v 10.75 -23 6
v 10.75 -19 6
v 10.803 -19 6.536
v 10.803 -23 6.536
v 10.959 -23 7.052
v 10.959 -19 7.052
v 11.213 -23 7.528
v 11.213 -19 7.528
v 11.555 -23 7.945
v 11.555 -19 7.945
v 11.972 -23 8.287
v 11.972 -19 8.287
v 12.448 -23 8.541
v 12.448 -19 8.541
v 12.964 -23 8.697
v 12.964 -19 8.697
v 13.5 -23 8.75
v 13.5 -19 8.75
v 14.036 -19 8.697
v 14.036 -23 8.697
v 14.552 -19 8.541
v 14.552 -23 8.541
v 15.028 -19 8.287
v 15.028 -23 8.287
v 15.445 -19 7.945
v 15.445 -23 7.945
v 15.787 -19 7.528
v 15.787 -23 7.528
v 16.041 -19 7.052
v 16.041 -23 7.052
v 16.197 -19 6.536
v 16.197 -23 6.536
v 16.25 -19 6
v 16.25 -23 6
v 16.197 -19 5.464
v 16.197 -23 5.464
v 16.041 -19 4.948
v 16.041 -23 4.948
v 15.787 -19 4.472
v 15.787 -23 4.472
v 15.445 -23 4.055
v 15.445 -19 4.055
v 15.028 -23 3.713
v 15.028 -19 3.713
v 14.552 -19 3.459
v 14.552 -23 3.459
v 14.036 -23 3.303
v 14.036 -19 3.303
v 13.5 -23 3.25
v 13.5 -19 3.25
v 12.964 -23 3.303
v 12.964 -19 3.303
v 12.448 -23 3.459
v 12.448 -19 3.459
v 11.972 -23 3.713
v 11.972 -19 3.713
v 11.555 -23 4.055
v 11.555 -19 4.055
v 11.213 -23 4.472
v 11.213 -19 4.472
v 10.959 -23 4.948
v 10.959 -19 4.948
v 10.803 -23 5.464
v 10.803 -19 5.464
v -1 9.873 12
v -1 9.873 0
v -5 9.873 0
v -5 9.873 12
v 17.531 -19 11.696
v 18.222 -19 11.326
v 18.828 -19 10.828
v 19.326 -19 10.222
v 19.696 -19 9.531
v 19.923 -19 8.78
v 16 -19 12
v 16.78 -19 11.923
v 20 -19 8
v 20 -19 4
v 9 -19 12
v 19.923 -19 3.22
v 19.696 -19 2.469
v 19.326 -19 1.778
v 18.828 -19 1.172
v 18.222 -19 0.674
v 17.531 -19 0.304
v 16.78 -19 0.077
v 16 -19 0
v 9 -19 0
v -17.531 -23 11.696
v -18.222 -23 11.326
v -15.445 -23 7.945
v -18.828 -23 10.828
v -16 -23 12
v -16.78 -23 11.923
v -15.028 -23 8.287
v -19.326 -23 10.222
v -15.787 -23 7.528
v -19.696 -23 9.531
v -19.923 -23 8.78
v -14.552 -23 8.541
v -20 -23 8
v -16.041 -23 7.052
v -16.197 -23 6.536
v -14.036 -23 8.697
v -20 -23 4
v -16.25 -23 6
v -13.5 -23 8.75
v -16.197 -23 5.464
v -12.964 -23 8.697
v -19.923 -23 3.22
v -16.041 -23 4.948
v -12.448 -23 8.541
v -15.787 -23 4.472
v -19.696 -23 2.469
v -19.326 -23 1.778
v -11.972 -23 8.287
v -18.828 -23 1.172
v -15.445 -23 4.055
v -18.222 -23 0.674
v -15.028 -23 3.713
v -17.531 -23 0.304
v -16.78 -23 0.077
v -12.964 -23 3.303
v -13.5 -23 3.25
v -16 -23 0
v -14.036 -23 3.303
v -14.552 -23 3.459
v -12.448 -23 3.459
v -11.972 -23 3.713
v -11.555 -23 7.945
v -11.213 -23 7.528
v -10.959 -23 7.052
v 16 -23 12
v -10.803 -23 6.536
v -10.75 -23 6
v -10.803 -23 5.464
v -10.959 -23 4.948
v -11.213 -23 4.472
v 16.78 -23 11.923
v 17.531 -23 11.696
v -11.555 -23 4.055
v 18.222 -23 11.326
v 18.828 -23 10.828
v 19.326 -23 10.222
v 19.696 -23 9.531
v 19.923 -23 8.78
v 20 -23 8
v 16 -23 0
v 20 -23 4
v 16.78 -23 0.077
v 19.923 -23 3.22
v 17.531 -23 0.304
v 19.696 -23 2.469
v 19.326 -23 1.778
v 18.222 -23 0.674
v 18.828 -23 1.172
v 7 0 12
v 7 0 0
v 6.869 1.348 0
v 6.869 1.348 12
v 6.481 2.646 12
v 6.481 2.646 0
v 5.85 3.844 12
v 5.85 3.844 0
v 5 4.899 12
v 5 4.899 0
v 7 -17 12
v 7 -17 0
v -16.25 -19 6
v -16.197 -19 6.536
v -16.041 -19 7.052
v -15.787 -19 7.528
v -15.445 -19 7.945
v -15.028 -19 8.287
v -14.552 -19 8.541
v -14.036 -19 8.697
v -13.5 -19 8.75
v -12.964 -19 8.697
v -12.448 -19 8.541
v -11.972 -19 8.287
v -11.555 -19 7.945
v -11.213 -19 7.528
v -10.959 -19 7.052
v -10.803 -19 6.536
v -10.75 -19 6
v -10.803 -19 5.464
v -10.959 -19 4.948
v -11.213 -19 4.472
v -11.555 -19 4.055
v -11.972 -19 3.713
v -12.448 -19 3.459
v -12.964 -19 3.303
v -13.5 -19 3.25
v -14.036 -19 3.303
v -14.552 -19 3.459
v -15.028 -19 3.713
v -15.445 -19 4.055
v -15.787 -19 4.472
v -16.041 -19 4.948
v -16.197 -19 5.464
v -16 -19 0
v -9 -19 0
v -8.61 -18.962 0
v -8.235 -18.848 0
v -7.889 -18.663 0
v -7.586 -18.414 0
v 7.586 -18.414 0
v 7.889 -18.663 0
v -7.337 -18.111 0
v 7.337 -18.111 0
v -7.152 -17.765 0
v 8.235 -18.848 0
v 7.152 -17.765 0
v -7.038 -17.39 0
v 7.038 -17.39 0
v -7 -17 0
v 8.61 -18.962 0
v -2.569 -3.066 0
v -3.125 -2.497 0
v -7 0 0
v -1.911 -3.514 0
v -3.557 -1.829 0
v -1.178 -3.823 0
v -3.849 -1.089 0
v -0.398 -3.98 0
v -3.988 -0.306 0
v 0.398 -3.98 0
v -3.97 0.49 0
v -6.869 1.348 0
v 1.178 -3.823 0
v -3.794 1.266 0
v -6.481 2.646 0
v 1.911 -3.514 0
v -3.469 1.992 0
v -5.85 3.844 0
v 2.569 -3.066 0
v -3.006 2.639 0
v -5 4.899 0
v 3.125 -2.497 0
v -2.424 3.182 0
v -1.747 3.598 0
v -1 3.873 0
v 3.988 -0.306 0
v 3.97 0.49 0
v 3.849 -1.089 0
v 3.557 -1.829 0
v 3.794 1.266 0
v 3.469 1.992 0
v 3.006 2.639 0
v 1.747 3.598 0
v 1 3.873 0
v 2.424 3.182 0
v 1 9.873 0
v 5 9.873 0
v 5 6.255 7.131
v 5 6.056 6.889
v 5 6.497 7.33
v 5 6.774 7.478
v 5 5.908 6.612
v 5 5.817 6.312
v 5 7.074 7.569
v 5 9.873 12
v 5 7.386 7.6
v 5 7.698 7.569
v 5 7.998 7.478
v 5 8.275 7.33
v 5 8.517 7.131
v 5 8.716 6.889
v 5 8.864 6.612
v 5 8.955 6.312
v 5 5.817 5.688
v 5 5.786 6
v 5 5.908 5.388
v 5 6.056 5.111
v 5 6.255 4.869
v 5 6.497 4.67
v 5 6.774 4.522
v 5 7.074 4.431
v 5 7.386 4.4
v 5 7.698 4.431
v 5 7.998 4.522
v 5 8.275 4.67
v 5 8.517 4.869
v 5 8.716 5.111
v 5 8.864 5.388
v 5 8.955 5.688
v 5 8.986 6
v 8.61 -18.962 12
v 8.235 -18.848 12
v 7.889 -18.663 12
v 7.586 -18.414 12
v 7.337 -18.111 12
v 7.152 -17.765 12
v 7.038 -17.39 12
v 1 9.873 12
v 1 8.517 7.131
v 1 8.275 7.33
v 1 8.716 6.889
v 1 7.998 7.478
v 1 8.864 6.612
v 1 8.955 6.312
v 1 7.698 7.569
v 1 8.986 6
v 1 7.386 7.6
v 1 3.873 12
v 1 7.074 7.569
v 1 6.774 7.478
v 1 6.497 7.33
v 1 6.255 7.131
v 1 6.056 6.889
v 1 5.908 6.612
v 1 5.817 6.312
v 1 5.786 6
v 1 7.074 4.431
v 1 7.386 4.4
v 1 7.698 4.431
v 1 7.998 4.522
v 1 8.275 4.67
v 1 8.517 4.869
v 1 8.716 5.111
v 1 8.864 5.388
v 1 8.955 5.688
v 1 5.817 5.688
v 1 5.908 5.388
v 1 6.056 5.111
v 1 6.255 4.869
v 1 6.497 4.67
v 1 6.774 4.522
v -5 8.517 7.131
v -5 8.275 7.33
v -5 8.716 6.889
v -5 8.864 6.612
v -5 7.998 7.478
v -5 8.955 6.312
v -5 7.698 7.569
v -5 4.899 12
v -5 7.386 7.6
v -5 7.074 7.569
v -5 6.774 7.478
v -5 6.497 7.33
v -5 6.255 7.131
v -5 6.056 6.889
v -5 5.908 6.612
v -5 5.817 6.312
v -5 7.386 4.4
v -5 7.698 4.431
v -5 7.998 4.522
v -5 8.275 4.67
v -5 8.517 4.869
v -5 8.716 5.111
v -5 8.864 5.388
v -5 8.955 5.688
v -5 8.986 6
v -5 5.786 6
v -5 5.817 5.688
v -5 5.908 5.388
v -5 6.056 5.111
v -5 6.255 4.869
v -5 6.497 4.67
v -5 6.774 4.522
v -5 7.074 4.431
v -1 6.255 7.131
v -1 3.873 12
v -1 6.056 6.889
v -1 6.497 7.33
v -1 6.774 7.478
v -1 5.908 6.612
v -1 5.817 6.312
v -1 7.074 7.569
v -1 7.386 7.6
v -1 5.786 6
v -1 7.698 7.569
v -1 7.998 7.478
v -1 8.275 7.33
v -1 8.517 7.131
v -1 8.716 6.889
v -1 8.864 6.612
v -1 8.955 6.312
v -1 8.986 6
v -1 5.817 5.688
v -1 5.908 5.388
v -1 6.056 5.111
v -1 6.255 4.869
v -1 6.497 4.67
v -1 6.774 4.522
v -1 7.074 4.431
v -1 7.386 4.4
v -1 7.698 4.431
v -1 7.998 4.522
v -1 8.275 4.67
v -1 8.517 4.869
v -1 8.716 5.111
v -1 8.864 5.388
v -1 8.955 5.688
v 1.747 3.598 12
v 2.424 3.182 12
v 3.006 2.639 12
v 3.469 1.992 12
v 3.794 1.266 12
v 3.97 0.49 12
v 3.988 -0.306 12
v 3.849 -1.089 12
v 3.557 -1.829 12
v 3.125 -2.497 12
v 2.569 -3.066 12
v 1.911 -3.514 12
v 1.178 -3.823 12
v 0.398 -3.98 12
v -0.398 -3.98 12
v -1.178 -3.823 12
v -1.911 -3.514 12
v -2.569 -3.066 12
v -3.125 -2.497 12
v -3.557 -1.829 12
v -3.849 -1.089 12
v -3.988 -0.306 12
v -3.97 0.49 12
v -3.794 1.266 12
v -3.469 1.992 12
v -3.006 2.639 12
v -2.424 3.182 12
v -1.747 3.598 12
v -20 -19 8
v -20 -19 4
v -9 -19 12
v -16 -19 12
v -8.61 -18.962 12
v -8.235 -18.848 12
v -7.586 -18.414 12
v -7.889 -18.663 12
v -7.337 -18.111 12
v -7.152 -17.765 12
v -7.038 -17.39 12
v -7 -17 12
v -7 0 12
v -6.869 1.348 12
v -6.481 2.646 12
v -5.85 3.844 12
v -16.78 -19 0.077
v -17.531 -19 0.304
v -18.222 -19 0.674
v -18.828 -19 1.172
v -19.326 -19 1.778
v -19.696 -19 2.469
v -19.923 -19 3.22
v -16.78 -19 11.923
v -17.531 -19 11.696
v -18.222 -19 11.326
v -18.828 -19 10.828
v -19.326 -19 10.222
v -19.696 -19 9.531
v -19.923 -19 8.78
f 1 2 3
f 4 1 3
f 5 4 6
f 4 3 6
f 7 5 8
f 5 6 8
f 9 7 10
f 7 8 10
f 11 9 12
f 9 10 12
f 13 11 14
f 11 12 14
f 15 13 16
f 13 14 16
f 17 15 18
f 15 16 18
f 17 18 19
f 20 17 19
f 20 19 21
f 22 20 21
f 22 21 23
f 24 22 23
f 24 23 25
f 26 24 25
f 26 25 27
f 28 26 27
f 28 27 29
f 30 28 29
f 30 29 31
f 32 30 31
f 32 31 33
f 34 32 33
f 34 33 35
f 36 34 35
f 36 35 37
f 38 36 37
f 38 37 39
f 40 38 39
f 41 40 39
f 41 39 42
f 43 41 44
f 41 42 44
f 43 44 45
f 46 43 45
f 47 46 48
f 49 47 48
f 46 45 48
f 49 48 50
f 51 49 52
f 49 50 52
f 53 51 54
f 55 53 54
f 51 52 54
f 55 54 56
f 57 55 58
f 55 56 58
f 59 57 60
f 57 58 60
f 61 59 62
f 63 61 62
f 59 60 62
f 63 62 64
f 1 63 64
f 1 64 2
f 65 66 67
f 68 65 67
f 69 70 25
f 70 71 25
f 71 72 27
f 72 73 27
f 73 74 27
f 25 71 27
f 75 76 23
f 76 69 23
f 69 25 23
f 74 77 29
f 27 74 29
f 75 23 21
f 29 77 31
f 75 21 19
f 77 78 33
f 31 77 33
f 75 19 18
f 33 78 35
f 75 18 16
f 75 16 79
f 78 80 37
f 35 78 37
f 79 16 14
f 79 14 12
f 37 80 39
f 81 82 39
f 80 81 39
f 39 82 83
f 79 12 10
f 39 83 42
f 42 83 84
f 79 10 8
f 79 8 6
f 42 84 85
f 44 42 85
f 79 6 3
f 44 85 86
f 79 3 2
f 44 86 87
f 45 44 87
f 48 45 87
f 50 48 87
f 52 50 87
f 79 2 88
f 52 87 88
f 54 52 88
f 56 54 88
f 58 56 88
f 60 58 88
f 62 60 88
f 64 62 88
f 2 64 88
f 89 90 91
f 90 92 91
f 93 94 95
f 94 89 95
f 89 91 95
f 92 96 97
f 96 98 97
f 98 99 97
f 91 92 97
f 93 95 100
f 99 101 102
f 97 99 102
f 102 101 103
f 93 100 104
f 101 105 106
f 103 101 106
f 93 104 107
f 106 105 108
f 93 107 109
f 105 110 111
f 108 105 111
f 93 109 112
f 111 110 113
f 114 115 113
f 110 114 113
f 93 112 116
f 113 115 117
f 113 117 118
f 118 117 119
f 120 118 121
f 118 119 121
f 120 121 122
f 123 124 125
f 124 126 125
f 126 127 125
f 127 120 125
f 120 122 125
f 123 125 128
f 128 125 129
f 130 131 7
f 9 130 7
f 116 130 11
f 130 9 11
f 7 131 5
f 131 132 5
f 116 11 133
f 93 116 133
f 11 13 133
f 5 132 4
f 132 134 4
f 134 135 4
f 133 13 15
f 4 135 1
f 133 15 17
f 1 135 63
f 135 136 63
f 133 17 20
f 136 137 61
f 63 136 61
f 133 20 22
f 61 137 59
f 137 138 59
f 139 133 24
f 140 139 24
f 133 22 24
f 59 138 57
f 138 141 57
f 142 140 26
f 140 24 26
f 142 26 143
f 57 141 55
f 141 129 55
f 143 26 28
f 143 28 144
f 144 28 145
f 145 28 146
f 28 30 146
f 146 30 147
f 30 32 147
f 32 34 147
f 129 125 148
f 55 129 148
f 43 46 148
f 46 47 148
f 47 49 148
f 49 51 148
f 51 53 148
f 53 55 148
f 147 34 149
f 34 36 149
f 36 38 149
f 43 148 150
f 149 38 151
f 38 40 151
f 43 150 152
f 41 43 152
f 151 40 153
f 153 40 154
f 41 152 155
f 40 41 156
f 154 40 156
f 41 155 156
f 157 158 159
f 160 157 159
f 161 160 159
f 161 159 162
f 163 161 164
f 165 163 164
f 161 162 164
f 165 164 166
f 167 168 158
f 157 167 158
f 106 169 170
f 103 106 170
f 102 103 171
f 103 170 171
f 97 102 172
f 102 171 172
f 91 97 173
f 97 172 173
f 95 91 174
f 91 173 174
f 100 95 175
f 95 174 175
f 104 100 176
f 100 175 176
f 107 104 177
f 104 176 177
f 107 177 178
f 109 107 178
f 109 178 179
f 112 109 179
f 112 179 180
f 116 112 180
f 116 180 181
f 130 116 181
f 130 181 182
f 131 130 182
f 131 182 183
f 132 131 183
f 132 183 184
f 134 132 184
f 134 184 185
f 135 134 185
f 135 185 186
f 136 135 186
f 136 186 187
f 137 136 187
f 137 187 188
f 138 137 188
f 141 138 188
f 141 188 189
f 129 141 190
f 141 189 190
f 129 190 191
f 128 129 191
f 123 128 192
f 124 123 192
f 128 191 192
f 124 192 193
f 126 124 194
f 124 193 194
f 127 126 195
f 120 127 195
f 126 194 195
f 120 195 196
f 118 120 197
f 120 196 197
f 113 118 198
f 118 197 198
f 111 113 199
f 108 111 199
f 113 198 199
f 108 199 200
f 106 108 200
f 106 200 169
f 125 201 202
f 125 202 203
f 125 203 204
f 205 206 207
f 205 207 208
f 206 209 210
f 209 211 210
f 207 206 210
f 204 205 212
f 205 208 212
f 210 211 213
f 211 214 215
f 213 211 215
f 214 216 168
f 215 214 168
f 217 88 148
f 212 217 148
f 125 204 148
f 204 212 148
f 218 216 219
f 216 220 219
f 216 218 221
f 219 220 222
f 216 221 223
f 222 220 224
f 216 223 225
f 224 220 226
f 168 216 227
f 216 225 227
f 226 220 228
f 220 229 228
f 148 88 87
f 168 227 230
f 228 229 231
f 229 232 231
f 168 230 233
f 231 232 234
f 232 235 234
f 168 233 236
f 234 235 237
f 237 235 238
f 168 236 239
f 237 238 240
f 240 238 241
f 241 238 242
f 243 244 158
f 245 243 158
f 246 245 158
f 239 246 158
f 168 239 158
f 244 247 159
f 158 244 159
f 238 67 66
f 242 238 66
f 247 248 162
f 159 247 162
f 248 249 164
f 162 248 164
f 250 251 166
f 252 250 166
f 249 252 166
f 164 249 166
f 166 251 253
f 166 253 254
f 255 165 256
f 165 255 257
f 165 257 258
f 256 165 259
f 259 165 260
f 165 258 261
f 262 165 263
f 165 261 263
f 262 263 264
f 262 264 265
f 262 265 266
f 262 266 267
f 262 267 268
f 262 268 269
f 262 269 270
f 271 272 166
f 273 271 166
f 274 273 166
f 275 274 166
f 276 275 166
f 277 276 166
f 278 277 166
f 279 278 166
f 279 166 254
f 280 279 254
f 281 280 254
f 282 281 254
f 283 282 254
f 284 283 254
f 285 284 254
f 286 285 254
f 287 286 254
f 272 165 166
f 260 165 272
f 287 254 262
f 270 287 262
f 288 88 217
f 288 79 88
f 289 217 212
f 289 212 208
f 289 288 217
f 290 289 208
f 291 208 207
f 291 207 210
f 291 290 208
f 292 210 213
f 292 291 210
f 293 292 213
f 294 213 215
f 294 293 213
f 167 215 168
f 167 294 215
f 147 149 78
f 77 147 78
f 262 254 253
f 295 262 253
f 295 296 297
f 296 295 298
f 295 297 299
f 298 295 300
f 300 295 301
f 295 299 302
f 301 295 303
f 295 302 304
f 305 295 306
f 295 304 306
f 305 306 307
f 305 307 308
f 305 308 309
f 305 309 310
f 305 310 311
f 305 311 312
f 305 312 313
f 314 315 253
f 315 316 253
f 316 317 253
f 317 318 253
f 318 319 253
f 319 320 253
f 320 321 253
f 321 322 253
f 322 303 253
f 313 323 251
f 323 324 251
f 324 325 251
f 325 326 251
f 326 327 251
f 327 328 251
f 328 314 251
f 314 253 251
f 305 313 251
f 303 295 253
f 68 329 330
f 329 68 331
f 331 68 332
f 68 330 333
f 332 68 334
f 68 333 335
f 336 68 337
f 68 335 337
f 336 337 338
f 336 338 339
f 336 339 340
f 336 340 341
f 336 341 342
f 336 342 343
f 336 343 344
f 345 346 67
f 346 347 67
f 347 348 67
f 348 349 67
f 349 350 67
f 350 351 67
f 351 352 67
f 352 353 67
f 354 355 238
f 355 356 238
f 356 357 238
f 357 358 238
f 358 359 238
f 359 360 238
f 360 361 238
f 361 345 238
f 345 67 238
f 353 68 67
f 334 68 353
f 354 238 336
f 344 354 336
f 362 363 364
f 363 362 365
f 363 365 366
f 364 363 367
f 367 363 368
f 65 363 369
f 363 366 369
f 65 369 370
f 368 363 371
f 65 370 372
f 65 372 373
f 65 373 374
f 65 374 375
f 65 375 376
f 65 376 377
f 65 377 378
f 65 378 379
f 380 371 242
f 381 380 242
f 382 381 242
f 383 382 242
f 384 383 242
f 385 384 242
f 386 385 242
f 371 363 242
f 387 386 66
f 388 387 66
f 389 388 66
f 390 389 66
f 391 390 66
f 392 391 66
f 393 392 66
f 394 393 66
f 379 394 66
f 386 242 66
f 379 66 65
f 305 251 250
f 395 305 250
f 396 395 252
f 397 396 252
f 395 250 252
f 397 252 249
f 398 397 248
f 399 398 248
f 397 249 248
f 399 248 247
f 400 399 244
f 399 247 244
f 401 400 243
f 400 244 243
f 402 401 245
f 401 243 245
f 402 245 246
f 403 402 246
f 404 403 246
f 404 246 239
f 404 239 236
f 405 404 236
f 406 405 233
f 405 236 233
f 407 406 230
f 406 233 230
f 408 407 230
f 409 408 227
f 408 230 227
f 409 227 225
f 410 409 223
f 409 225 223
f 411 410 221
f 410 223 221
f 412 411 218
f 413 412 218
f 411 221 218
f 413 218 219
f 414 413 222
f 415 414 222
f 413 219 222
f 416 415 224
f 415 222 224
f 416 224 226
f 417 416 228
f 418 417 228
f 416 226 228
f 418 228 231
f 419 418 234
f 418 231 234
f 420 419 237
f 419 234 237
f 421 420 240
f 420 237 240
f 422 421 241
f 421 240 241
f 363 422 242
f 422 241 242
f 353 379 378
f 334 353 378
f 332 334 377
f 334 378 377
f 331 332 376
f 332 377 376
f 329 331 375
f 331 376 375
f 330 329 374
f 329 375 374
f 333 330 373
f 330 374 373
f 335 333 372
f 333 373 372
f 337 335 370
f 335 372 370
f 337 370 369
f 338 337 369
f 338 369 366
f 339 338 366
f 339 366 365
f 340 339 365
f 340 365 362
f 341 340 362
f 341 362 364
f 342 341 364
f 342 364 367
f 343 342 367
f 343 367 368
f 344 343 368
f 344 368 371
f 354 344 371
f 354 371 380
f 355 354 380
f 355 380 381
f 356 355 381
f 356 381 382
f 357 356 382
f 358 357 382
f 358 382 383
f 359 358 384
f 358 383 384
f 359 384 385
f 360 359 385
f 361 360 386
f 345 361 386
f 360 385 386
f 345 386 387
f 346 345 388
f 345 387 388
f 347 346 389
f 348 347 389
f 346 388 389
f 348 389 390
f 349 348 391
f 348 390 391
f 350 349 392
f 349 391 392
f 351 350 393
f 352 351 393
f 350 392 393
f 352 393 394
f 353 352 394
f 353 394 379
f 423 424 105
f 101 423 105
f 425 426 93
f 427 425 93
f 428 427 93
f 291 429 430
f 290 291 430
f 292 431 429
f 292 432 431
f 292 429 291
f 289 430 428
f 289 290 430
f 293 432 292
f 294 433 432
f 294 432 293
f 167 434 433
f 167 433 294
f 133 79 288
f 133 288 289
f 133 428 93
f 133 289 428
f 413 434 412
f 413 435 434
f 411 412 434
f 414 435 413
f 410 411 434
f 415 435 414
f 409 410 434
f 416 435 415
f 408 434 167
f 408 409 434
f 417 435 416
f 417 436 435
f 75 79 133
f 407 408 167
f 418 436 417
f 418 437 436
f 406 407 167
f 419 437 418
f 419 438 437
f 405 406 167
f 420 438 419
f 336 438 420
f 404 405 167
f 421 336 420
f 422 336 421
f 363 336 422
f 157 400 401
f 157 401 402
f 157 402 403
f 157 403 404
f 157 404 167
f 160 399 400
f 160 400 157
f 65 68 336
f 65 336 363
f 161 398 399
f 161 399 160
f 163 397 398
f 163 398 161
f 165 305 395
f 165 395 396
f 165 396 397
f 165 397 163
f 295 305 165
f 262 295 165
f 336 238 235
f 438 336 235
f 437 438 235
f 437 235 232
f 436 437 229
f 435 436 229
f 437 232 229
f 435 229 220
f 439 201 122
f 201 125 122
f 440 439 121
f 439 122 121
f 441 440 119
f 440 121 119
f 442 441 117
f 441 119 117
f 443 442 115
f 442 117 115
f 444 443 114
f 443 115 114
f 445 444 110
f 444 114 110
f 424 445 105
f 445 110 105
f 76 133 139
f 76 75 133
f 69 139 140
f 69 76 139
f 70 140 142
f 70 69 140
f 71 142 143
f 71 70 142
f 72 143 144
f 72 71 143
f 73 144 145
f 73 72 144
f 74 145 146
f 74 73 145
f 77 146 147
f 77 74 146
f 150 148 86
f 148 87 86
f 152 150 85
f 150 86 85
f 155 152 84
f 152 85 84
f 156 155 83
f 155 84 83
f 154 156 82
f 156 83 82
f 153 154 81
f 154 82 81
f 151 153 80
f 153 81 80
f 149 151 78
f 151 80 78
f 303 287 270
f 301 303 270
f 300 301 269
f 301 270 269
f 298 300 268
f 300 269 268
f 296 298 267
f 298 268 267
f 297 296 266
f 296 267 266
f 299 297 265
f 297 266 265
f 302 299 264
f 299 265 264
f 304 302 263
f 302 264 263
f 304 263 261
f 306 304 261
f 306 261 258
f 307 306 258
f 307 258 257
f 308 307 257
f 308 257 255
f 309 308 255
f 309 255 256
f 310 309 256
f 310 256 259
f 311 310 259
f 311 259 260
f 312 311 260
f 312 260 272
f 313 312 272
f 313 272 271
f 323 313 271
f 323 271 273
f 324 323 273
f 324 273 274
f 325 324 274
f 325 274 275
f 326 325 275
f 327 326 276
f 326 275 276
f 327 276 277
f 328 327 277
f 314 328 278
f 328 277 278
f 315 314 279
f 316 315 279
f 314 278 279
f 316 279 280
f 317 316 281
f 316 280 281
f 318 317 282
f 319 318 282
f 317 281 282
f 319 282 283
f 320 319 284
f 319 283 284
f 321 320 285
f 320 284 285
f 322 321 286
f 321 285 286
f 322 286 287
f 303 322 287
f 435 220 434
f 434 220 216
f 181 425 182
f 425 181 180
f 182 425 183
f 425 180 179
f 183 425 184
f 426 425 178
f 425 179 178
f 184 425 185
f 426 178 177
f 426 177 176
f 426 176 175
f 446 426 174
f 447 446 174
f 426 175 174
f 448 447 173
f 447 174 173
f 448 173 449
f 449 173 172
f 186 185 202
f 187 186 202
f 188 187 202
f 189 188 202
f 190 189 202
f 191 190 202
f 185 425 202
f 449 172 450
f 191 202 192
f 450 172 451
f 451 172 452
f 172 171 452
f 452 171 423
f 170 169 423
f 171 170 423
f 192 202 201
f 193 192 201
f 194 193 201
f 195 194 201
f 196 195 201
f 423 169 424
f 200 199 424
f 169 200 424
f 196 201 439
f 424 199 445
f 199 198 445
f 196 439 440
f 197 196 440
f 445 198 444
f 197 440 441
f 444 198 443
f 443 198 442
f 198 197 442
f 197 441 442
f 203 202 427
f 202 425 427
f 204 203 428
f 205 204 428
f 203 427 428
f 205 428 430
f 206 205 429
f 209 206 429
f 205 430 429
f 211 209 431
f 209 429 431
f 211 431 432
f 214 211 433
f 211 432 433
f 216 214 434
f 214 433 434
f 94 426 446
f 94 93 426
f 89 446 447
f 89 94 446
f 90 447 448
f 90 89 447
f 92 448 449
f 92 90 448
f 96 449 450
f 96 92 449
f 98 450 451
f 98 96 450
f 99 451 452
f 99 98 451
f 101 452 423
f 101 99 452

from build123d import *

# Parameters (mm, degrees)
F1_DEPTH = 12
F2_R     = 2.75
F3_DEPTH = 25
F4_R     = 4
F5_R     = 2
F6_R     = 1.6
F7_DEPTH = 25.001


with BuildPart() as f1:
    # F0 (on Top) → F1 (new body)
    with BuildSketch(Plane.XY):
        with BuildLine():
            ThreePointArc((1, 3.872983), (0, -4), (-1, 3.872983))
            Line((-1, 3.872983), (-1, 6.928203))
            Line((-1, 6.928203), (-1, 9.872983))
            Line((-1, 9.872983), (-5, 9.872983))
            Line((-5, 9.872983), (-5, 4.898979))
            ThreePointArc((-5, 4.898979), (-6.480741, 2.645751), (-7, 0))
            Line((-7, 0), (-7, -19))
            Line((-7, -19), (-20, -19))
            Line((-20, -19), (-20, -23))
            Line((-20, -23), (0, -23))
            Line((0, -23), (20, -23))
            Line((20, -23), (20, -19))
            Line((20, -19), (7, -19))
            Line((7, -19), (7, 0))
            ThreePointArc((7, 0), (6.480741, 2.645751), (5, 4.898979))
            Line((5, 4.898979), (5, 9.872983))
            Line((5, 9.872983), (1, 9.872983))
            Line((1, 9.872983), (1, 6.872983))
            Line((1, 6.872983), (1, 3.872983))
        make_face()
    extrude(amount=F1_DEPTH)

    # F2 (on face) → F3 (cut)
    with BuildSketch(Plane(origin=(0, -19, 0), x_dir=(-1, 0, 0), z_dir=(0, 1, 0))):
        with Locations((-13.5, 6)):
            Circle(F2_R)
        with Locations((13.5, 6)):
            Circle(F2_R)
    extrude(amount=-F3_DEPTH, mode=Mode.SUBTRACT)

    # F4
    f4_edges = [f1.edges().sort_by_distance(p)[0] for p in [
        (20, -21, 12),
        (20, -21, 0),
        (-20, -21, 0),
        (-20, -21, 12),
    ]]
    fillet(f4_edges, radius=F4_R)

    # F5
    f5_edges = [f1.edges().sort_by_distance(p)[0] for p in [
        (7, -19, 6),
        (-7, -19, 6),
    ]]
    fillet(f5_edges, radius=F5_R)

    # F6 (on face) → F7 (cut, through all)
    with BuildSketch(Plane.YZ.offset(5)):
        with Locations((7.385981, 6)):
            Circle(F6_R)
    extrude(amount=-F7_DEPTH, mode=Mode.SUBTRACT)


solid = f1.part
